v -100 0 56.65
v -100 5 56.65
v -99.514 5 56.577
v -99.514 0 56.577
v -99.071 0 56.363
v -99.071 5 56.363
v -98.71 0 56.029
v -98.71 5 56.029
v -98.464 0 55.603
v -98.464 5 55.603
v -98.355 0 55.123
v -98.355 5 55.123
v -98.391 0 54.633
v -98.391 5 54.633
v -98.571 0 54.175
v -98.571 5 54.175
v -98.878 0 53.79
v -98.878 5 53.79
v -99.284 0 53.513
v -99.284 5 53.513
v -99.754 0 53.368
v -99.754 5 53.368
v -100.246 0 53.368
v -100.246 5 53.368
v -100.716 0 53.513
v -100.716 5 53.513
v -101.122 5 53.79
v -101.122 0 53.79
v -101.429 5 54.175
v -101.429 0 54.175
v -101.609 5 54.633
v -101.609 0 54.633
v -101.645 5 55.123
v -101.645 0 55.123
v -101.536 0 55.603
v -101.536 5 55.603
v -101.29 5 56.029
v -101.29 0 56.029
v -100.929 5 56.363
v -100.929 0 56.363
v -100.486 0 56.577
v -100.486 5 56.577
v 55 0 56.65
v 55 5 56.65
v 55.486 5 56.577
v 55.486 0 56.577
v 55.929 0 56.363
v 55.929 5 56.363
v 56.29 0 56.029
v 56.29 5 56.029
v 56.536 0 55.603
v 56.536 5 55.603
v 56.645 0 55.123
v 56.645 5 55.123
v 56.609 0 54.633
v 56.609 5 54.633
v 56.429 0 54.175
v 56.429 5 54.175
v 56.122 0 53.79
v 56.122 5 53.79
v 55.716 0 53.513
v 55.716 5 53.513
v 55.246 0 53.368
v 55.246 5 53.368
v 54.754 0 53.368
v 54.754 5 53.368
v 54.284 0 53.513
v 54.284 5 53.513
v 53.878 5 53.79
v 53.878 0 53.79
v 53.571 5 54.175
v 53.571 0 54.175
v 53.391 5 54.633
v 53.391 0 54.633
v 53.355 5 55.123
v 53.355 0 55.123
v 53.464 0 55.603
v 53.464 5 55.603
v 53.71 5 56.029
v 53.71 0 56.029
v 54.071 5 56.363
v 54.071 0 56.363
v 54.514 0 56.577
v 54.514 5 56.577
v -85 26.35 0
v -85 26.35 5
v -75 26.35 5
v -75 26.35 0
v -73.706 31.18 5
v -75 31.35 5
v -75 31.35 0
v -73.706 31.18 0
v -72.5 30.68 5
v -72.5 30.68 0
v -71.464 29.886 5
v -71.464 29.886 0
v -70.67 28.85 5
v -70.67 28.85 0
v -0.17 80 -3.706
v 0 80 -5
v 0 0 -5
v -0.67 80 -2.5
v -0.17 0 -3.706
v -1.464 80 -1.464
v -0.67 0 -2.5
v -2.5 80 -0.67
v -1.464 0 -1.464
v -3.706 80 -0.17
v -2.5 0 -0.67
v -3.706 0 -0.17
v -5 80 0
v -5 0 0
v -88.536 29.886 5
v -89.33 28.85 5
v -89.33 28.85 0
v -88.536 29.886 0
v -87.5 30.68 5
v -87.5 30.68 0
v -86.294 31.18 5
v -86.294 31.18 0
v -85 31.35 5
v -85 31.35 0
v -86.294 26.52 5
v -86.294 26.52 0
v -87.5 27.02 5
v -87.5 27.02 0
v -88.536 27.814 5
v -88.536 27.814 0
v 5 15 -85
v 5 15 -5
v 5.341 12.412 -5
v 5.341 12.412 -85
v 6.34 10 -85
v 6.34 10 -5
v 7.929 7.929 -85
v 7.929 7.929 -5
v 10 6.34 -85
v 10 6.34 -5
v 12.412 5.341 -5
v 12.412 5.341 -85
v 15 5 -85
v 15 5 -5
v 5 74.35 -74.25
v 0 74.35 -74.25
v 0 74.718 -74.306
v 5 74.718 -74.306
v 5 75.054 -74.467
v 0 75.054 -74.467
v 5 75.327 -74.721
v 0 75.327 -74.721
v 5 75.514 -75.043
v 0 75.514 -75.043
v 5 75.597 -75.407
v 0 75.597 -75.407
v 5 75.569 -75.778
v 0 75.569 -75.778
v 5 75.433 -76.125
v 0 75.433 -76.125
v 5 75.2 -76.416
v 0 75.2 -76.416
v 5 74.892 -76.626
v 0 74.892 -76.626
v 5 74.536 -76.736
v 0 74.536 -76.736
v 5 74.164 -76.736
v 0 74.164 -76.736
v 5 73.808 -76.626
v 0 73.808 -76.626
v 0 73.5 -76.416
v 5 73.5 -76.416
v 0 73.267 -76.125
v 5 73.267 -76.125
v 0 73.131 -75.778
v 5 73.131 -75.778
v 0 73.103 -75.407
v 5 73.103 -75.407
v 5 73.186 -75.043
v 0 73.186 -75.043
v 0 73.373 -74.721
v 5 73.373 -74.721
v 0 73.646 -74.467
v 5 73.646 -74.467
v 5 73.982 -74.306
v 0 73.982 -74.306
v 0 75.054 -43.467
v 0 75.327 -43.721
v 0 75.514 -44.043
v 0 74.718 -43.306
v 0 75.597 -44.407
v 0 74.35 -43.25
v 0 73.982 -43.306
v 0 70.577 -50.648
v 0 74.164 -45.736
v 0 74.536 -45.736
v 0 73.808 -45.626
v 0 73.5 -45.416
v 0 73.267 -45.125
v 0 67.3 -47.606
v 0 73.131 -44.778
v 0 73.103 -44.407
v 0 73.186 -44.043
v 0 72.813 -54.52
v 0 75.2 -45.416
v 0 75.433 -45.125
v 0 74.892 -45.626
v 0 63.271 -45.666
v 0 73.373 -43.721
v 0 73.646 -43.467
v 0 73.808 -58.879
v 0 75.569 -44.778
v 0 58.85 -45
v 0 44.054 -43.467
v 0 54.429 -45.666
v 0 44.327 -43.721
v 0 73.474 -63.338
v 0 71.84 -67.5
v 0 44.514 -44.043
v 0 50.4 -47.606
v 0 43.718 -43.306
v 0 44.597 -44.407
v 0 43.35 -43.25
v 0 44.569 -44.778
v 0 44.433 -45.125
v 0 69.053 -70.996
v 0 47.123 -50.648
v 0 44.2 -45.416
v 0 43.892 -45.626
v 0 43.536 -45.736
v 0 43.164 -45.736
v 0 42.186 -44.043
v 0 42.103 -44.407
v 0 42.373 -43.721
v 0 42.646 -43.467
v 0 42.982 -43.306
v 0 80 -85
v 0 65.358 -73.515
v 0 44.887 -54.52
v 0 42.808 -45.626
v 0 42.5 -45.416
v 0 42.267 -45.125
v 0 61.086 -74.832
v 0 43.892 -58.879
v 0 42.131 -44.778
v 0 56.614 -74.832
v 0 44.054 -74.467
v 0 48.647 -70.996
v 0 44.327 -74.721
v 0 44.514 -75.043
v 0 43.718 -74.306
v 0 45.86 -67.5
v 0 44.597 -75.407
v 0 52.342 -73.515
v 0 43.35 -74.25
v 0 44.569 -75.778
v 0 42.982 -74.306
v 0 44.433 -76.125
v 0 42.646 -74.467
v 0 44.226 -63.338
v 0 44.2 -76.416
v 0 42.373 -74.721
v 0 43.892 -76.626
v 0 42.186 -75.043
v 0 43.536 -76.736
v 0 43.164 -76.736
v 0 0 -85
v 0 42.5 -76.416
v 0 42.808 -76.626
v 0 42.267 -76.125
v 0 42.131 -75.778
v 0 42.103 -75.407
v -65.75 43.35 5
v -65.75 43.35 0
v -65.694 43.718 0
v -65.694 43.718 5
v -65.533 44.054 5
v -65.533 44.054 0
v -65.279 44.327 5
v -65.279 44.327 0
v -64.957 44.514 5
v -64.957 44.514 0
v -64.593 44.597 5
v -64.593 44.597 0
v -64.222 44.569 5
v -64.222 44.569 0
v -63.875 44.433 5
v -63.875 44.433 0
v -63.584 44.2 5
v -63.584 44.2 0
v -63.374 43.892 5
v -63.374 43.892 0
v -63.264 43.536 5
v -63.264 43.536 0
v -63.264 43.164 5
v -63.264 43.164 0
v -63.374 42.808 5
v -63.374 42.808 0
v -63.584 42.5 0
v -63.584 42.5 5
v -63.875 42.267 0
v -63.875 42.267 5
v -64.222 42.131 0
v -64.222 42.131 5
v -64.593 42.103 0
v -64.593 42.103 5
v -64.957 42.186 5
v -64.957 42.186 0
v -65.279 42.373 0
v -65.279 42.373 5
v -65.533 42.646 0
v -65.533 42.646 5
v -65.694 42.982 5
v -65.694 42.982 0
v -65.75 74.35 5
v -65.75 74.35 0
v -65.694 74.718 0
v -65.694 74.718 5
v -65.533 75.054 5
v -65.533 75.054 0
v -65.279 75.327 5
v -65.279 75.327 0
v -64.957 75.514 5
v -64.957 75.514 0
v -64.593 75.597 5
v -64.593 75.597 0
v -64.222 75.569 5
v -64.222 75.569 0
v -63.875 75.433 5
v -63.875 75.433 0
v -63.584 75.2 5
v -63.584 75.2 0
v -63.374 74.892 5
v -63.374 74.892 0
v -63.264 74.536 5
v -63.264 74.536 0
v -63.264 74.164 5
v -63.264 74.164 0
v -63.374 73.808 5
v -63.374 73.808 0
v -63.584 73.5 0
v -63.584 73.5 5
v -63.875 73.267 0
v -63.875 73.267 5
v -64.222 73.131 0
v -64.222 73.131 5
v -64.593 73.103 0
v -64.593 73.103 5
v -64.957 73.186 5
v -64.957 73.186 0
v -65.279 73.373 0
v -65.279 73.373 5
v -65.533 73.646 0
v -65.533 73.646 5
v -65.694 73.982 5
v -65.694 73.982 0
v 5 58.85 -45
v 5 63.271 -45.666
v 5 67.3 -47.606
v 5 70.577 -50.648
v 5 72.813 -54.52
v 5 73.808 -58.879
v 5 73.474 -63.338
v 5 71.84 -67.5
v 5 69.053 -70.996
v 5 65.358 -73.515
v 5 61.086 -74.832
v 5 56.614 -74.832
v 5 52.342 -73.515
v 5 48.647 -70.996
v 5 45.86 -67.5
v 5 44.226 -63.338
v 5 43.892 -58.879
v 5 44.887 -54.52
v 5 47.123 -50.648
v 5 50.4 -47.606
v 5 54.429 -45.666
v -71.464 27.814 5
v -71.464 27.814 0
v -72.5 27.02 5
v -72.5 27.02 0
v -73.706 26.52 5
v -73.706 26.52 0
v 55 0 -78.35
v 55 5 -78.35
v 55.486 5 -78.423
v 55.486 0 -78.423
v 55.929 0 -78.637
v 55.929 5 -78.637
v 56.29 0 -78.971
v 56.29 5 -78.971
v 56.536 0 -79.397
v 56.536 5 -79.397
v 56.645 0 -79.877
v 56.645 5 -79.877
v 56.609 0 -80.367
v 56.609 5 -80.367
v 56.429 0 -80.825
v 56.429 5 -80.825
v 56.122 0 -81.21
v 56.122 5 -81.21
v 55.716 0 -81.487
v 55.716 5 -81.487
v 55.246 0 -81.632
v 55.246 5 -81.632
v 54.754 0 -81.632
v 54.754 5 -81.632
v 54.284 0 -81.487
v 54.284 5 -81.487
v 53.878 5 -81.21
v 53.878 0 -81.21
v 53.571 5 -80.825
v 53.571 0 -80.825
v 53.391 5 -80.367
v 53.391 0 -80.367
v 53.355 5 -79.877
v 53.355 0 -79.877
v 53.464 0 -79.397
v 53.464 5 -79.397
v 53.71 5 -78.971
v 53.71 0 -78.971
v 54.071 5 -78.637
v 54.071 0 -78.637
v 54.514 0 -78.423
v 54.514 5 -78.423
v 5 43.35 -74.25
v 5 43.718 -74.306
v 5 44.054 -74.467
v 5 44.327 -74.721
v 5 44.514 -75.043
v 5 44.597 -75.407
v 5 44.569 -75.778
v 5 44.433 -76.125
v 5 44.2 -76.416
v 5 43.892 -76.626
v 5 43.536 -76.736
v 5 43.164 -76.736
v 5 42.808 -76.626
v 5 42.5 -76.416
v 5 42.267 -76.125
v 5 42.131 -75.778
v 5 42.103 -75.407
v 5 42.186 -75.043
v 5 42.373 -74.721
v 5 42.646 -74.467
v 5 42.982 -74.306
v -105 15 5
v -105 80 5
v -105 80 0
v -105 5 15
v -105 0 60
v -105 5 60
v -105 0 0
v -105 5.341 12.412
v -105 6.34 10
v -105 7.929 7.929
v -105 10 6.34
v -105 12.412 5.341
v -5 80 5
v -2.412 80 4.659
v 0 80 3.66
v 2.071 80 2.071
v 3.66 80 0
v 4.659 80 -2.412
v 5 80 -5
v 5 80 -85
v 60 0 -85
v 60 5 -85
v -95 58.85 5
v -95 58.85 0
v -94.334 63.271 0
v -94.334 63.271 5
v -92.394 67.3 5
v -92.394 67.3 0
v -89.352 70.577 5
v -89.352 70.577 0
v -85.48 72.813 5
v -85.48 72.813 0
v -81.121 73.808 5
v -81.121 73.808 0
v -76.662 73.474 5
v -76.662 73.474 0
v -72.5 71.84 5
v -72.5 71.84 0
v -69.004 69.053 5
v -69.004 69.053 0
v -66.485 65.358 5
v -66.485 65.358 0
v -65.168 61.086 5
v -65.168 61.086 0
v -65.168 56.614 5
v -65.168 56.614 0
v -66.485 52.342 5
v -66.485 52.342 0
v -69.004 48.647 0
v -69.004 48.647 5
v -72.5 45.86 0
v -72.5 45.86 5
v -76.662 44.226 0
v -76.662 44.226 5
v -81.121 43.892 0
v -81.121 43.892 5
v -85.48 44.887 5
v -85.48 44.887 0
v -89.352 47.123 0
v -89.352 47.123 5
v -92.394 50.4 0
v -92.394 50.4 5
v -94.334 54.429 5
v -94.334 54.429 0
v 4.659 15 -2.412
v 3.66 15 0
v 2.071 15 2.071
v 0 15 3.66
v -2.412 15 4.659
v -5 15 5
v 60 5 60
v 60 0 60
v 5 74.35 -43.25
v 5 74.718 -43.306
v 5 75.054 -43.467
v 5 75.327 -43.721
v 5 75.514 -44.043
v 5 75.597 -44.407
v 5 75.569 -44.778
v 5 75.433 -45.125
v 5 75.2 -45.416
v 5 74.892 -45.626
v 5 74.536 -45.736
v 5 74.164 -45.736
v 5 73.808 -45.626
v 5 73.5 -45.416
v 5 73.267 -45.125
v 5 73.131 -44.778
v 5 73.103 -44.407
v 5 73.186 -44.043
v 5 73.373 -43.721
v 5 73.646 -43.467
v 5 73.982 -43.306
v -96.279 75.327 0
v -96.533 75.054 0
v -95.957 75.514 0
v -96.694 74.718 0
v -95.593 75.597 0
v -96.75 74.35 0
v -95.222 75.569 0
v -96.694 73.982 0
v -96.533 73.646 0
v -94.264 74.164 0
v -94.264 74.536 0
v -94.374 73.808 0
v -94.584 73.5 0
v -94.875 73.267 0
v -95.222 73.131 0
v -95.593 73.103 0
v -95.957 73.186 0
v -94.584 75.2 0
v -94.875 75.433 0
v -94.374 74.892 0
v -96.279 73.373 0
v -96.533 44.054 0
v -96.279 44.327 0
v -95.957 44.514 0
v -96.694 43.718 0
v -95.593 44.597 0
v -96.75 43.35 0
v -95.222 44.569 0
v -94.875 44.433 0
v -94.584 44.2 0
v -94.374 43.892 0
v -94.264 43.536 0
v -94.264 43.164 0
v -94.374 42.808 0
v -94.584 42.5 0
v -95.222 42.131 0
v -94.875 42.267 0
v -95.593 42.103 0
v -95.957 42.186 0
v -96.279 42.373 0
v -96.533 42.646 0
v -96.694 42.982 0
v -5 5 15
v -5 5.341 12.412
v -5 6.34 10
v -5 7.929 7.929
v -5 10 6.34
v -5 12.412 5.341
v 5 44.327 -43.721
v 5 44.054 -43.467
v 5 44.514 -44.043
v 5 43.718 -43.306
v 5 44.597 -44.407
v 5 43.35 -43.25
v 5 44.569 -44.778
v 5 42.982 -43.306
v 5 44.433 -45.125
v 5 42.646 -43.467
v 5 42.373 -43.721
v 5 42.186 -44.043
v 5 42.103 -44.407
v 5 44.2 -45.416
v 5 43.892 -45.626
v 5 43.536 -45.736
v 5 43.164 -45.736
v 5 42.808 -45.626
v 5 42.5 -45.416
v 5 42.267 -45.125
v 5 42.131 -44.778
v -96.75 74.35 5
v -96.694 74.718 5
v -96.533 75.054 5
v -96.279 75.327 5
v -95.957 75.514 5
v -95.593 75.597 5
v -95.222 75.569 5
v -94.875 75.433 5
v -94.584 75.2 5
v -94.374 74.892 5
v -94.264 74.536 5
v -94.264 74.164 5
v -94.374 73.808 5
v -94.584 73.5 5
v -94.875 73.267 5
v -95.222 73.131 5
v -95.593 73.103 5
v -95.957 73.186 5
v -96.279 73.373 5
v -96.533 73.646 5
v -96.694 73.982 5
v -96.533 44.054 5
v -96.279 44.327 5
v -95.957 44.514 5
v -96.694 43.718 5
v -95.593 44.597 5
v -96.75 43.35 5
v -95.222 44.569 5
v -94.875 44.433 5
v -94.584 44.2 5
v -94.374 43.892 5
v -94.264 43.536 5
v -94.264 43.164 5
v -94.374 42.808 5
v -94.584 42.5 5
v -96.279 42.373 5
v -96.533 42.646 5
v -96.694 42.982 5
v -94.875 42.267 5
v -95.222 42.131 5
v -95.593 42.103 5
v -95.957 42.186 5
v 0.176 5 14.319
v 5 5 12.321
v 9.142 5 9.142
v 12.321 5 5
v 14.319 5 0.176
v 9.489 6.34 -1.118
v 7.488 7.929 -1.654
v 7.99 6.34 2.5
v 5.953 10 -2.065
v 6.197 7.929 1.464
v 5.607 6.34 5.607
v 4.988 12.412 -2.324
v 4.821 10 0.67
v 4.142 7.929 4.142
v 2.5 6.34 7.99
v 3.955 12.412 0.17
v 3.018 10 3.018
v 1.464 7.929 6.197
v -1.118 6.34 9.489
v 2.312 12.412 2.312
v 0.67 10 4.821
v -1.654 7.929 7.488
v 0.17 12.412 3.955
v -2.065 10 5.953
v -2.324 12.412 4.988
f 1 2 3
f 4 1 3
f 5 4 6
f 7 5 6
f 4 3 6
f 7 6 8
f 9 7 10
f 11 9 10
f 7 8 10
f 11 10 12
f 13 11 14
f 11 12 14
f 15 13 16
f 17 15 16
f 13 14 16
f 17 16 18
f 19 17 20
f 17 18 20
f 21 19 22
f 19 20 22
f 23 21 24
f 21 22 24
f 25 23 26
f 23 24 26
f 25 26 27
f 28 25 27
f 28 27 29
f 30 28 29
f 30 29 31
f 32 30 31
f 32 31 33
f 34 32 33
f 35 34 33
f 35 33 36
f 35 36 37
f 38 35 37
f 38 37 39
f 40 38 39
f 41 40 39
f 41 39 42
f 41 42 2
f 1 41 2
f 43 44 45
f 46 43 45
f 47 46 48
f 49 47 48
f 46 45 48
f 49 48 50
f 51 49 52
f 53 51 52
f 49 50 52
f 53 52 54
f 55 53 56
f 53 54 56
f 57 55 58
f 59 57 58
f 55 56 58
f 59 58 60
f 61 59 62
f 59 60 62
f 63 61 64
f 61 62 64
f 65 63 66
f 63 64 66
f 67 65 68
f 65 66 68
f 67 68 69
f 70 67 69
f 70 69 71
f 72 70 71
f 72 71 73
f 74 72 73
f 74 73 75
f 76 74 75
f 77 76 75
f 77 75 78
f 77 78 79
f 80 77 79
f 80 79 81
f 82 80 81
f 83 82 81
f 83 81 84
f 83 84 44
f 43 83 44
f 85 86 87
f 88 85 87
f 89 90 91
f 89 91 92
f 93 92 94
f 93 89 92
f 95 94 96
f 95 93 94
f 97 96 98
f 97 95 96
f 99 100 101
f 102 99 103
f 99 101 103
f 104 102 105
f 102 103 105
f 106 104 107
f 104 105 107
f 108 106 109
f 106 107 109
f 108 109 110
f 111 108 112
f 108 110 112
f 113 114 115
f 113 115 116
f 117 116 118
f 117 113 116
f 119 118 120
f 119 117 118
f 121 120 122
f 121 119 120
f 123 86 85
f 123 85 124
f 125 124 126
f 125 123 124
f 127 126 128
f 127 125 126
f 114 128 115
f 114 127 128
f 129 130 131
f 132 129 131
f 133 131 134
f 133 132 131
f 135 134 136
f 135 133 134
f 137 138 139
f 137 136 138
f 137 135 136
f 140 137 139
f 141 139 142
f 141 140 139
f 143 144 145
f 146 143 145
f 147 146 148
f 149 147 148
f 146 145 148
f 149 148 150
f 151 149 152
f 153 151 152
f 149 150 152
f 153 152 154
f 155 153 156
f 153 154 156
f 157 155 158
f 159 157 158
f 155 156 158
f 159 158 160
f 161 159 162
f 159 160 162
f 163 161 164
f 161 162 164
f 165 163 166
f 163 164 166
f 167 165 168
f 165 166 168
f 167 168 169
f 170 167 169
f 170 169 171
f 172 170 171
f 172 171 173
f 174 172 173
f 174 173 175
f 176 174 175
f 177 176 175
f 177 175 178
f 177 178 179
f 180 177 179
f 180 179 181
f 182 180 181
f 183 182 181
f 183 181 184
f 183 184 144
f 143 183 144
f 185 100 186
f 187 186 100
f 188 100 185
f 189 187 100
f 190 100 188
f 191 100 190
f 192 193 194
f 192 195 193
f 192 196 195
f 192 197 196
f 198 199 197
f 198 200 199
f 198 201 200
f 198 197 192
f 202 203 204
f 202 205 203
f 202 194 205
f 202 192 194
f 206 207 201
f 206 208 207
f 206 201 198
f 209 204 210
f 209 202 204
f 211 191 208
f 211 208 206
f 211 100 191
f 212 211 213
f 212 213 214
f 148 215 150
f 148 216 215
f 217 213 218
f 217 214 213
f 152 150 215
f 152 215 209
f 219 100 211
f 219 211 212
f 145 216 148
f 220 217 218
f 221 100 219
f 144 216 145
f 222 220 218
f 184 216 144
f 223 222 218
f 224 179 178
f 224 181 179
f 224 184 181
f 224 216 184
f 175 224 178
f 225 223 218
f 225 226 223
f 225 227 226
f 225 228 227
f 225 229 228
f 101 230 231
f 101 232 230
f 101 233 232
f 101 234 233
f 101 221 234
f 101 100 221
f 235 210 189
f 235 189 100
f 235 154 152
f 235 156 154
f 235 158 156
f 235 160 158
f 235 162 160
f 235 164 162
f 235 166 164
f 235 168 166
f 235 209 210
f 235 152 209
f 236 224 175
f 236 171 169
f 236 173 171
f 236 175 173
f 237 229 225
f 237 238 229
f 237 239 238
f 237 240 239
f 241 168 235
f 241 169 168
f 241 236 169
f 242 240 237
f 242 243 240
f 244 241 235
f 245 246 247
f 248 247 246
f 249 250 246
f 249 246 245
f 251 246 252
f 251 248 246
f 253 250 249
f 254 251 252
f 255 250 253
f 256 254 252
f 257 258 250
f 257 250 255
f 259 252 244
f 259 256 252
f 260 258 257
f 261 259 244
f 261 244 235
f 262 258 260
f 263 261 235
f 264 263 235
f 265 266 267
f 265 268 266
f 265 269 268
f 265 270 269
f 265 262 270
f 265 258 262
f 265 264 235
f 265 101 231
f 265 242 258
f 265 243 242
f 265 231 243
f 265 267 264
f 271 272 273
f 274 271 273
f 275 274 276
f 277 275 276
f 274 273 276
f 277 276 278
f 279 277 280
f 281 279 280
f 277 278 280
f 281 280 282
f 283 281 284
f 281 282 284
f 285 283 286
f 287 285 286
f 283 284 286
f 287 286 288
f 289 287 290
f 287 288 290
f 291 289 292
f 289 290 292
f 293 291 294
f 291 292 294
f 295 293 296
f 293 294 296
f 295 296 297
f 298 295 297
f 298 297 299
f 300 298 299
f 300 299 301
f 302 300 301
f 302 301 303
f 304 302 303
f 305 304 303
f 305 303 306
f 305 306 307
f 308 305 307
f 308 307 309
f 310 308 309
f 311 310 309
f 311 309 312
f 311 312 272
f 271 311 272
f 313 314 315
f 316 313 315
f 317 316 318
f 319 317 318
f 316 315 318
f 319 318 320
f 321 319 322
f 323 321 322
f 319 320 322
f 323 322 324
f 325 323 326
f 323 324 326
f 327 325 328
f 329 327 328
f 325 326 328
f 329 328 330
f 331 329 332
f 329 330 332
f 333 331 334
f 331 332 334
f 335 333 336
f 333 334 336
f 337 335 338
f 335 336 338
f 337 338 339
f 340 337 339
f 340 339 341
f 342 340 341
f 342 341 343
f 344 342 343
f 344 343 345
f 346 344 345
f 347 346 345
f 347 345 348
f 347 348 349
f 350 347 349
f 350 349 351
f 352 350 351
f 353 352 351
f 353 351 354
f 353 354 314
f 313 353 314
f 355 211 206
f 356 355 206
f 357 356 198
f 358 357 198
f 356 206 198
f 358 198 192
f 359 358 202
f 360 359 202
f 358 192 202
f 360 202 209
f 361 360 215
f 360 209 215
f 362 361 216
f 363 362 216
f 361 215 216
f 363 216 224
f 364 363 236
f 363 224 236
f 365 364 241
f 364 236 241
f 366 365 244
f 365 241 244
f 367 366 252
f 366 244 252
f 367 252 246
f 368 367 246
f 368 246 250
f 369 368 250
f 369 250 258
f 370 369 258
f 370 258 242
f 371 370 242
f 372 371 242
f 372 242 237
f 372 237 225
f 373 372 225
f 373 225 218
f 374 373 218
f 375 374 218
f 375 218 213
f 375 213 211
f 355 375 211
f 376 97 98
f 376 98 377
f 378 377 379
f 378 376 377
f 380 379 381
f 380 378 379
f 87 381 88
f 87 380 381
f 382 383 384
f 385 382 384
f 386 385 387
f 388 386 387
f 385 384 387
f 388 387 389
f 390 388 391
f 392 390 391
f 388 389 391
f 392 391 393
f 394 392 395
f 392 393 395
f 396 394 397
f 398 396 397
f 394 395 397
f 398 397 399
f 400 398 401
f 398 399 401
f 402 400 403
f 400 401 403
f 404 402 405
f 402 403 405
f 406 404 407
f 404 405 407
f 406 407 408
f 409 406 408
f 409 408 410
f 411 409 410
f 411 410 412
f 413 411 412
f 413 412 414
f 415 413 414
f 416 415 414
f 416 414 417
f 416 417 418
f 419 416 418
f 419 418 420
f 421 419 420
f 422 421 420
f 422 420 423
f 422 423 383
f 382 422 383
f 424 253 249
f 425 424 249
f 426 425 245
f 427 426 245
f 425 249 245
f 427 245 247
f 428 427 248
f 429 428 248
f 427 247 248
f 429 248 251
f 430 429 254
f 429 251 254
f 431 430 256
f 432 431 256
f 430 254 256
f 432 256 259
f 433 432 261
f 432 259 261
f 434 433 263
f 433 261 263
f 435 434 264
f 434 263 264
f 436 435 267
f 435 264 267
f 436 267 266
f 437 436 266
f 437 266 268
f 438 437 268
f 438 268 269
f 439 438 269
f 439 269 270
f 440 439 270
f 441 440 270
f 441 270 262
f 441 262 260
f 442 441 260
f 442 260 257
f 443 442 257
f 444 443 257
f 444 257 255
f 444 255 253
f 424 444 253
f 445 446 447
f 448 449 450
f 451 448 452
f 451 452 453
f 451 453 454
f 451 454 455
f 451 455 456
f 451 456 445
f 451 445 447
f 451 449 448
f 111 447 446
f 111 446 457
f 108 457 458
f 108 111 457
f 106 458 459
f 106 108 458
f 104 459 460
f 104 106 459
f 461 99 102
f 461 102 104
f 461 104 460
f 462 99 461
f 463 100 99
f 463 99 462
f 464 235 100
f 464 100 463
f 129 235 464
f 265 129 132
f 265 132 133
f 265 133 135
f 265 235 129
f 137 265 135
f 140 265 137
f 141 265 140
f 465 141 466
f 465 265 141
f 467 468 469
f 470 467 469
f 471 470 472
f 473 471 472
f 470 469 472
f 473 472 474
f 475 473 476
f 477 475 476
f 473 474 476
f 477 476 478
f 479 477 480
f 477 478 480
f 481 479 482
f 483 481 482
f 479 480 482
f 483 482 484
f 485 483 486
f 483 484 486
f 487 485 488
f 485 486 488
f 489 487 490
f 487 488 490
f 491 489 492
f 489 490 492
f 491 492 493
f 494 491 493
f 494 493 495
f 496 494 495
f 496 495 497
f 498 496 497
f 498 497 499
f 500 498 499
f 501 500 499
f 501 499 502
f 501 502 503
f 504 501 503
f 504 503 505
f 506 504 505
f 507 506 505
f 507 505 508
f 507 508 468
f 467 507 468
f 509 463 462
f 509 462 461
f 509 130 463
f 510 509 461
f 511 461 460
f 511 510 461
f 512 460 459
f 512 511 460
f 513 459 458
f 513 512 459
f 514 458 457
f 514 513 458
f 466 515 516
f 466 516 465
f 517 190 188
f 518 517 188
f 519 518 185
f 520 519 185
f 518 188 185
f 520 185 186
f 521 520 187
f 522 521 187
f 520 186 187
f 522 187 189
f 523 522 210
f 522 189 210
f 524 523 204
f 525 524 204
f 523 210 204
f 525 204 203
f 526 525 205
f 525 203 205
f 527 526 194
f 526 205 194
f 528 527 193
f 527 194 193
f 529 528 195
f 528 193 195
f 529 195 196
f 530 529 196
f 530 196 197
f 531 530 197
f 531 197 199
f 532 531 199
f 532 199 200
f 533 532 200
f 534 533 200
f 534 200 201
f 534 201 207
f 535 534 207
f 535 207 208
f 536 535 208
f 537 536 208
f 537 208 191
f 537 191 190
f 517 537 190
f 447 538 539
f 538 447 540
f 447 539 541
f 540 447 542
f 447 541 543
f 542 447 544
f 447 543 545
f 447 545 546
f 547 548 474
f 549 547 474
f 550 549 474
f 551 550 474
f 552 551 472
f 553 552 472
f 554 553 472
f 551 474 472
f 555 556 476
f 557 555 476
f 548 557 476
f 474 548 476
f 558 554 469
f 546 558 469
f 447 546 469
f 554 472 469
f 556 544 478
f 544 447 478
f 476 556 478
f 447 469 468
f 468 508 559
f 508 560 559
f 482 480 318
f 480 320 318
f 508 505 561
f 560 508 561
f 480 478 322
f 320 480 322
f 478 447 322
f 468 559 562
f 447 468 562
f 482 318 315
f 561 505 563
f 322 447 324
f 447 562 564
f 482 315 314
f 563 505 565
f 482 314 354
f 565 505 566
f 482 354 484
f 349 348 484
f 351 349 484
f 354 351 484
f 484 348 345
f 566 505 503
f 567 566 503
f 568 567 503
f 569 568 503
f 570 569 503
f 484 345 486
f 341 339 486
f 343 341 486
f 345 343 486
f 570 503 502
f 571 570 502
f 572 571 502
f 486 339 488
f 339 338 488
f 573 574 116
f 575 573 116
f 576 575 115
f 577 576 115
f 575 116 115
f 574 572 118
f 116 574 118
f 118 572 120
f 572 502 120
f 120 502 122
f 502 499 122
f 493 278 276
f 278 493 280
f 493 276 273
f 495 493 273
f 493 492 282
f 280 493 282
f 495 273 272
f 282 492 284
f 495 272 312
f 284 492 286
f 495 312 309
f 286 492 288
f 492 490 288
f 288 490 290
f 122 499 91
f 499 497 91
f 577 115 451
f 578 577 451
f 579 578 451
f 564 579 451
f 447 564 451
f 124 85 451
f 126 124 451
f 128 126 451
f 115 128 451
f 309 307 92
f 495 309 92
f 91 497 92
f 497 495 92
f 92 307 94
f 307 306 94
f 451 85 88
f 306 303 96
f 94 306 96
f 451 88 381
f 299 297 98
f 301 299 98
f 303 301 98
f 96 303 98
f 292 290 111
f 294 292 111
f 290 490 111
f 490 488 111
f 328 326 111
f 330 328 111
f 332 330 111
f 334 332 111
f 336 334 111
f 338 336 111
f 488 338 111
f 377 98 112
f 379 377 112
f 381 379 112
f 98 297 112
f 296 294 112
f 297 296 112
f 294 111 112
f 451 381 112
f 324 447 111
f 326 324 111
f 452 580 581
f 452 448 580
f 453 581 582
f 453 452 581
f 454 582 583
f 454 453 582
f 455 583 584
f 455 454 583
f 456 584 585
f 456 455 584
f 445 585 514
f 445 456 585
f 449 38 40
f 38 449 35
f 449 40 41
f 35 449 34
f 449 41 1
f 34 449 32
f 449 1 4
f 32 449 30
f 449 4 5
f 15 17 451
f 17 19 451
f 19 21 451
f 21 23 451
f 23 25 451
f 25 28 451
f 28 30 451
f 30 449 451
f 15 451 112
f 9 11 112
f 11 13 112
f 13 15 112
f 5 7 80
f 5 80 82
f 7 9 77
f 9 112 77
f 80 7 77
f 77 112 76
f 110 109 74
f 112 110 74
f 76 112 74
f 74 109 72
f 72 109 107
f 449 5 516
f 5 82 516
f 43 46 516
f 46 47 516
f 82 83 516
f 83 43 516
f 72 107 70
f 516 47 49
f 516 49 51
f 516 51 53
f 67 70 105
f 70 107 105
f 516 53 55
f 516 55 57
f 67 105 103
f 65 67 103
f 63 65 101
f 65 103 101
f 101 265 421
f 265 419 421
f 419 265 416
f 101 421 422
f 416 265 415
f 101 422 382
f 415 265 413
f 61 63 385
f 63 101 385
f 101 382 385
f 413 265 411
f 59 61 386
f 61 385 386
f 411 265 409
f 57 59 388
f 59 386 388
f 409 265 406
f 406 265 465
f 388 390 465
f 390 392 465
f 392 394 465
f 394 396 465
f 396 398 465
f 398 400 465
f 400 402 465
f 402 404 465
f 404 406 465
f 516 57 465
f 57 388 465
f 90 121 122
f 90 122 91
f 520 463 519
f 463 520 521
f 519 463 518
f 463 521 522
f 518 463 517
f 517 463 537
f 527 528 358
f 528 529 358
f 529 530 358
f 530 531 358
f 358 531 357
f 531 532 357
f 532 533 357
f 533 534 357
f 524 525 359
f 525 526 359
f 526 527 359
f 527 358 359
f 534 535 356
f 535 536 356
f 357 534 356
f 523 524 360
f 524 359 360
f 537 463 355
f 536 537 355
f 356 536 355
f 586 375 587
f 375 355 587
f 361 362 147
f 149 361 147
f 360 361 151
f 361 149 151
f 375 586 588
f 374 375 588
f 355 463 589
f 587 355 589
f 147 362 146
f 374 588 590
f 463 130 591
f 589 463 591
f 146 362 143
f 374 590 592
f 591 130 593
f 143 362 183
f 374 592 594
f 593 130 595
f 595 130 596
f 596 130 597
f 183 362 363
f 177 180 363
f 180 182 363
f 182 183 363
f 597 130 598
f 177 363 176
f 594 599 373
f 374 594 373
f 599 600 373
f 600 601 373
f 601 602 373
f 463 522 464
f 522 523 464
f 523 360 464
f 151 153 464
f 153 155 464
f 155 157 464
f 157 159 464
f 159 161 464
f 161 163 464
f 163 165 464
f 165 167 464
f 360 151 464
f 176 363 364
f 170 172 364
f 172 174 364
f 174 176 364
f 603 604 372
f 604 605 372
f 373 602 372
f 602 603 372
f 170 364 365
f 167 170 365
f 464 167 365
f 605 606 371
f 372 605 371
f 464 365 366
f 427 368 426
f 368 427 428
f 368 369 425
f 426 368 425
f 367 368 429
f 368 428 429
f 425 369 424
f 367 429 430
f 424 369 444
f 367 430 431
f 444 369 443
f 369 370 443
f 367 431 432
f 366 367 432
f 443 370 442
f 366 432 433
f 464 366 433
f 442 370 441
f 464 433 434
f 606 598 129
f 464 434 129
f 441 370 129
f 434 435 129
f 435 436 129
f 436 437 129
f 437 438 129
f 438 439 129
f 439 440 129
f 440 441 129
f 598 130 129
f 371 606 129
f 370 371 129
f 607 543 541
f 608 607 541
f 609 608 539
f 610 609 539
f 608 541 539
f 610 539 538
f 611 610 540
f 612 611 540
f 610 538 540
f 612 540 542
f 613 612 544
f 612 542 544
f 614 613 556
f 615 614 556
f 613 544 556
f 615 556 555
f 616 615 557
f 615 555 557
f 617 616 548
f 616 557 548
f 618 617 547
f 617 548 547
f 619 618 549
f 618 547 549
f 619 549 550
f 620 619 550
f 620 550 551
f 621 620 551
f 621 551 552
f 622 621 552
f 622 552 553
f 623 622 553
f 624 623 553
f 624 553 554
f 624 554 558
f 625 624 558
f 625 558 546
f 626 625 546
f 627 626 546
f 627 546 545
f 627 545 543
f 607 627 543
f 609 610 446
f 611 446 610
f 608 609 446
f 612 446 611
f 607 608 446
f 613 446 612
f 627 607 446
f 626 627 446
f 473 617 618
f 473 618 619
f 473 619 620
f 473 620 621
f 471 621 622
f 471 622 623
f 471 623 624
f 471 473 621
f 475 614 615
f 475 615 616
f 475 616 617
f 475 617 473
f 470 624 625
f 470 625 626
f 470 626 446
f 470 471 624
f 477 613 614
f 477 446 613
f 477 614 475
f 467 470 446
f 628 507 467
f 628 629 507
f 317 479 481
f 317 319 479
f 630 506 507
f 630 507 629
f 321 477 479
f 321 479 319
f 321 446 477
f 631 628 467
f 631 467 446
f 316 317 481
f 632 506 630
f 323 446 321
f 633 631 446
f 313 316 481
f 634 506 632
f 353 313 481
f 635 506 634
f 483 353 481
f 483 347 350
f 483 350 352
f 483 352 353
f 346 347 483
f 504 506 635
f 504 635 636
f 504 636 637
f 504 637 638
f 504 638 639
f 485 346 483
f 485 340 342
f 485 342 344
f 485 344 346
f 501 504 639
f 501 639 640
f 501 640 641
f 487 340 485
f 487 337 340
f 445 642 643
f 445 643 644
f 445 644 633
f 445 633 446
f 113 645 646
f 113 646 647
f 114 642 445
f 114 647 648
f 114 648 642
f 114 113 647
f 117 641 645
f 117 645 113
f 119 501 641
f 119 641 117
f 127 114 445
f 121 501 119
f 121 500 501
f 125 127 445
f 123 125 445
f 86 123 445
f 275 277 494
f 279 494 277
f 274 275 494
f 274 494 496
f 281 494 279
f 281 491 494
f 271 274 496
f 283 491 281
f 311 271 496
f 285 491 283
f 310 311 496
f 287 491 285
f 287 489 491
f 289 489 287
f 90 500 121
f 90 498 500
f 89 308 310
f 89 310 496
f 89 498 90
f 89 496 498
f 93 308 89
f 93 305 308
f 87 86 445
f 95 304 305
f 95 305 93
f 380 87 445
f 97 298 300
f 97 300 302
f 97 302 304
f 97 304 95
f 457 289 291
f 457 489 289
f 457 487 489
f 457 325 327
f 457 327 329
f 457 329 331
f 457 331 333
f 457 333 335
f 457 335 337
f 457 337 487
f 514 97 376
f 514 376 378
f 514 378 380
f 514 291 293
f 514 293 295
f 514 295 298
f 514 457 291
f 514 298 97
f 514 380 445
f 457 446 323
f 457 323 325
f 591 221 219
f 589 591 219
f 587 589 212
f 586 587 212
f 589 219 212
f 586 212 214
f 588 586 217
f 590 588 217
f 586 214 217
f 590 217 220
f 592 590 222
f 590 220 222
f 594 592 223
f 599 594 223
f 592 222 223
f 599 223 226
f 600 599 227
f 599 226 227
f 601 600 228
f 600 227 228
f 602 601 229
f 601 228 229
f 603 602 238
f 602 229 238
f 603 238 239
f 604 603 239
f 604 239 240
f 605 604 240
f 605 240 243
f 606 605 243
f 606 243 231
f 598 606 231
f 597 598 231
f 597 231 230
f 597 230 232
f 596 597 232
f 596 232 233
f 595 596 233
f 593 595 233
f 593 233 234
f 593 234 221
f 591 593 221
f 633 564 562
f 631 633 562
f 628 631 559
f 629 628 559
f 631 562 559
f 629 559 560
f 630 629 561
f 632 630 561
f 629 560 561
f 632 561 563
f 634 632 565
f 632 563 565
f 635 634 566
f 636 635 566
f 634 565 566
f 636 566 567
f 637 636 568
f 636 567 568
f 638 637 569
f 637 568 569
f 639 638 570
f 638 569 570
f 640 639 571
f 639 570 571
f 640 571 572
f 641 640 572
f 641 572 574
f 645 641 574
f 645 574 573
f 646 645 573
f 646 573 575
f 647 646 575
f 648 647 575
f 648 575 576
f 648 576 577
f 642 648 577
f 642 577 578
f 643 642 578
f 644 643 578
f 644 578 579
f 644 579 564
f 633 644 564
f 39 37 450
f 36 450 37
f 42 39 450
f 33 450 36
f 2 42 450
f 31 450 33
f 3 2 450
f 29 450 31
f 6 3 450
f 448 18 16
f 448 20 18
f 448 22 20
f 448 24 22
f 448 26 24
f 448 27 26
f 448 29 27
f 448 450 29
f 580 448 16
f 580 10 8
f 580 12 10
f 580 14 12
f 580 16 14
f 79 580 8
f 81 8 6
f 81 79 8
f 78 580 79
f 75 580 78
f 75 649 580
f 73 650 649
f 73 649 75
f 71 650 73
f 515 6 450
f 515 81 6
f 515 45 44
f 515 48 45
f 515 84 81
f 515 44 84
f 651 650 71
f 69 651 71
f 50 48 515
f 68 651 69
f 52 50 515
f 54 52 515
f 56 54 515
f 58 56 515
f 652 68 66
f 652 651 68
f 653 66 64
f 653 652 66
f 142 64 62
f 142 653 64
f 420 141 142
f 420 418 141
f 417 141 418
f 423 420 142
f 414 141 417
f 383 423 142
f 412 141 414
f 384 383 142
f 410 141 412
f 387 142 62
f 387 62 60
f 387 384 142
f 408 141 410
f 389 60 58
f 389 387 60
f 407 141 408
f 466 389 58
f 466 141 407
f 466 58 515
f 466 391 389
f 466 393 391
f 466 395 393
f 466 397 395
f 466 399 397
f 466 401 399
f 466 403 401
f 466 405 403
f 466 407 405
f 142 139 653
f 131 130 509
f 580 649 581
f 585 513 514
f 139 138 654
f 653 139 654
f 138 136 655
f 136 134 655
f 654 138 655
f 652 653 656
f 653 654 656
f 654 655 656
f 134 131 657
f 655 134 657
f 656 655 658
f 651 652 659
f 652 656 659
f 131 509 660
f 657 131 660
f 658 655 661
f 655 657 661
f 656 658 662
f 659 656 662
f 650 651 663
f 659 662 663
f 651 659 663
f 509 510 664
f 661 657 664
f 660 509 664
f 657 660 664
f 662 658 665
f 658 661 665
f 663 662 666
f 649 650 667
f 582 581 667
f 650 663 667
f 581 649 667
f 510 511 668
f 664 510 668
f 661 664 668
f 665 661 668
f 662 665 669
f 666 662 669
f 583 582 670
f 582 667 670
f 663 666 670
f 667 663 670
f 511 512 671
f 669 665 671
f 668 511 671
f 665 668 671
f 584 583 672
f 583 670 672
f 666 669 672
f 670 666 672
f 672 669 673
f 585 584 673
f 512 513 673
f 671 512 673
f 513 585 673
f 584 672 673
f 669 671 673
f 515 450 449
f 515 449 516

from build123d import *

# Parameters (mm, degrees)
BOSS_EXTRUDE1_DEPTH = 20
SKETCH2_W           = 5
SKETCH2_H           = 85
BOSS_EXTRUDE2_DEPTH = 60
SKETCH3_R           = 15
CUT_EXTRUDE1_DEPTH  = 100
SKETCH4_R           = 1.25
CUT_EXTRUDE2_DEPTH  = 100
SKETCH7_W           = 110
SKETCH7_H           = 5
BOSS_EXTRUDE6_DEPTH = 60
FILLET3_R           = 5
SKETCH8_W           = 25
SKETCH8_H           = 145
SKETCH8_H_2         = 25
SKETCH8_W_2         = 185
CUT_EXTRUDE3_DEPTH  = 100
SKETCH9_R           = 1.65
CUT_EXTRUDE4_DEPTH  = 100
SKETCH10_W          = 75
SKETCH10_H          = 55
SKETCH10_W_2        = 110
SKETCH10_H_2        = 90
CUT_EXTRUDE5_DEPTH  = 15
FILLET4_R           = 10
SKETCH11_W          = 20
SKETCH11_H          = 5
CUT_EXTRUDE6_DEPTH  = 6
FILLET5_R           = 5
SKETCH12_R          = 15
SKETCH12_R_2        = 1.25
CUT_EXTRUDE7_DEPTH  = 10
SKETCH13_W          = 20
SKETCH13_H          = 145
CUT_EXTRUDE8_DEPTH  = 10


with BuildPart() as part:
    # Sketch1 → Boss-Extrude1 (new body)
    with BuildSketch(Plane(origin=(0, 0, 0), x_dir=(1, 0, 0), z_dir=(0, 1, 0))):
        Polygon((105, 85), (0, 85), (0, 0), (-105, 0), (-105, -85), (105, -85), align=None)
    extrude(amount=BOSS_EXTRUDE1_DEPTH)

    # Sketch2 → Boss-Extrude2 (add)
    with BuildSketch(Plane(origin=(0, 20, 0), x_dir=(1, 0, 0), z_dir=(0, 1, 0))):
        with Locations((2.5, 42.5)):
            Rectangle(SKETCH2_W, SKETCH2_H)
    extrude(amount=BOSS_EXTRUDE2_DEPTH)

    # Sketch3 → Cut-Extrude1 (cut)
    with BuildSketch(Plane.ZY):
        with Locations((-60, 58.85)):
            Circle(SKETCH3_R)
    extrude(amount=-CUT_EXTRUDE1_DEPTH, mode=Mode.SUBTRACT)

    # Sketch4 → Cut-Extrude2 (cut)
    with BuildSketch(Plane.ZY):
        with Locations((-75.5, 74.35)):
            Circle(SKETCH4_R)
        with Locations((-44.5, 74.35)):
            Circle(SKETCH4_R)
        with Locations((-75.5, 43.35)):
            Circle(SKETCH4_R)
        with Locations((-44.5, 43.35)):
            Circle(SKETCH4_R)
    extrude(amount=-CUT_EXTRUDE2_DEPTH, mode=Mode.SUBTRACT)

    # Sketch7 → Boss-Extrude6 (add)
    with BuildSketch(Plane(origin=(0, 20, 0), x_dir=(1, 0, 0), z_dir=(0, 1, 0))):
        with Locations((-50, -2.5)):
            Rectangle(SKETCH7_W, SKETCH7_H)
    extrude(amount=BOSS_EXTRUDE6_DEPTH)

    # Fillet3
    fillet3_edges = [part.edges().sort_by_distance(p)[0] for p in [
        (0, 40, 0),
    ]]
    fillet(fillet3_edges, radius=FILLET3_R)

    # Sketch8 → Cut-Extrude3 (cut)
    with BuildSketch(Plane(origin=(0, 20, 0), x_dir=(1, 0, 0), z_dir=(0, 1, 0))):
        with Locations((92.5, 12.5)):
            Rectangle(SKETCH8_W, SKETCH8_H)
        with Locations((92.5, -72.5)):
            Rectangle(SKETCH8_W, SKETCH8_H_2)
        with Locations((-12.5, -72.5)):
            Rectangle(SKETCH8_W_2, SKETCH8_H_2)
    extrude(amount=-CUT_EXTRUDE3_DEPTH, mode=Mode.SUBTRACT)

    # Sketch9 → Cut-Extrude4 (cut)
    with BuildSketch(Plane(origin=(0, 20, 0), x_dir=(1, 0, 0), z_dir=(0, 1, 0))):
        with Locations(Location((55, 80, 0), (0, 0, 270))):
            Circle(SKETCH9_R)
        with Locations(Location((55, -55, 0), (0, 0, 270))):
            Circle(SKETCH9_R)
        with Locations(Location((-100, -55, 0), (0, 0, 270))):
            Circle(SKETCH9_R)
    extrude(amount=-CUT_EXTRUDE4_DEPTH, mode=Mode.SUBTRACT)

    # Sketch10 → Cut-Extrude5 (cut)
    with BuildSketch(Plane(origin=(0, 20, 0), x_dir=(1, 0, 0), z_dir=(0, 1, 0))):
        with Locations((42.5, -32.5)):
            Rectangle(SKETCH10_W, SKETCH10_H)
        with Locations((-50, -32.5)):
            Rectangle(SKETCH10_W_2, SKETCH10_H)
        with Locations((42.5, 40)):
            Rectangle(SKETCH10_W, SKETCH10_H_2)
    extrude(amount=-CUT_EXTRUDE5_DEPTH, mode=Mode.SUBTRACT)

    # Fillet4
    fillet4_edges = [part.edges().sort_by_distance(p)[0] for p in [
        (5, 5, -40),
        (-50, 5, 5),
        (5, 42.5, 5),
    ]]
    fillet(fillet4_edges, radius=FILLET4_R)

    # Sketch11 → Cut-Extrude6 (cut)
    with BuildSketch(Plane.XY.offset(5)):
        with Locations((-80, 28.85)):
            Rectangle(SKETCH11_W, SKETCH11_H)
    extrude(amount=-CUT_EXTRUDE6_DEPTH, mode=Mode.SUBTRACT)

    # Fillet5
    # the kernel refuses this fillet: 5 mm, written as the material it adds along each edge
    with BuildSketch(Plane(origin=(-90, 26.35, 5), x_dir=(0, 1, 0), z_dir=(0, 0, -1))) as fillet5_piece_1:
        with BuildLine():
            CenterArc((FILLET5_R, FILLET5_R), FILLET5_R, 180, 90)
            Line((0, FILLET5_R), (0, 0))
            Line((0, 0), (FILLET5_R, 0))
        make_face()
    extrude(amount=5)
    with BuildSketch(Plane(origin=(-90, 31.35, 5), x_dir=(0, -1, 0), z_dir=(0, 0, -1)), Plane(origin=(-70, 31.35, 5), x_dir=(-1, 0, 0), z_dir=(0, 0, -1)), Plane(origin=(-70, 26.35, 5), x_dir=(0, 1, 0), z_dir=(0, 0, -1))) as fillet5_piece_2:
        with BuildLine():
            CenterArc((FILLET5_R, -FILLET5_R), FILLET5_R, 90, 90)
            Line((0, -FILLET5_R), (0, 0))
            Line((0, 0), (FILLET5_R, 0))
        make_face()
    extrude(amount=5)

    # Sketch12 → Cut-Extrude7 (cut)
    with BuildSketch(Plane(origin=(0, 0, 0), x_dir=(-1, 0, 0), z_dir=(0, 0, -1))):
        with Locations((80, 58.85)):
            Circle(SKETCH12_R)
        with Locations((95.5, 74.35)):
            Circle(SKETCH12_R_2)
        with Locations((64.5, 74.35)):
            Circle(SKETCH12_R_2)
        with Locations((64.5, 43.35)):
            Circle(SKETCH12_R_2)
        with Locations((95.5, 43.35)):
            Circle(SKETCH12_R_2)
    extrude(amount=-CUT_EXTRUDE7_DEPTH, mode=Mode.SUBTRACT)

    # Sketch13 → Cut-Extrude8 (cut)
    with BuildSketch(Plane(origin=(0, 5, 0), x_dir=(1, 0, 0), z_dir=(0, 1, 0))):
        with Locations((70, 12.5)):
            Rectangle(SKETCH13_W, SKETCH13_H)
    extrude(amount=-CUT_EXTRUDE8_DEPTH, mode=Mode.SUBTRACT)


solid = part.part
